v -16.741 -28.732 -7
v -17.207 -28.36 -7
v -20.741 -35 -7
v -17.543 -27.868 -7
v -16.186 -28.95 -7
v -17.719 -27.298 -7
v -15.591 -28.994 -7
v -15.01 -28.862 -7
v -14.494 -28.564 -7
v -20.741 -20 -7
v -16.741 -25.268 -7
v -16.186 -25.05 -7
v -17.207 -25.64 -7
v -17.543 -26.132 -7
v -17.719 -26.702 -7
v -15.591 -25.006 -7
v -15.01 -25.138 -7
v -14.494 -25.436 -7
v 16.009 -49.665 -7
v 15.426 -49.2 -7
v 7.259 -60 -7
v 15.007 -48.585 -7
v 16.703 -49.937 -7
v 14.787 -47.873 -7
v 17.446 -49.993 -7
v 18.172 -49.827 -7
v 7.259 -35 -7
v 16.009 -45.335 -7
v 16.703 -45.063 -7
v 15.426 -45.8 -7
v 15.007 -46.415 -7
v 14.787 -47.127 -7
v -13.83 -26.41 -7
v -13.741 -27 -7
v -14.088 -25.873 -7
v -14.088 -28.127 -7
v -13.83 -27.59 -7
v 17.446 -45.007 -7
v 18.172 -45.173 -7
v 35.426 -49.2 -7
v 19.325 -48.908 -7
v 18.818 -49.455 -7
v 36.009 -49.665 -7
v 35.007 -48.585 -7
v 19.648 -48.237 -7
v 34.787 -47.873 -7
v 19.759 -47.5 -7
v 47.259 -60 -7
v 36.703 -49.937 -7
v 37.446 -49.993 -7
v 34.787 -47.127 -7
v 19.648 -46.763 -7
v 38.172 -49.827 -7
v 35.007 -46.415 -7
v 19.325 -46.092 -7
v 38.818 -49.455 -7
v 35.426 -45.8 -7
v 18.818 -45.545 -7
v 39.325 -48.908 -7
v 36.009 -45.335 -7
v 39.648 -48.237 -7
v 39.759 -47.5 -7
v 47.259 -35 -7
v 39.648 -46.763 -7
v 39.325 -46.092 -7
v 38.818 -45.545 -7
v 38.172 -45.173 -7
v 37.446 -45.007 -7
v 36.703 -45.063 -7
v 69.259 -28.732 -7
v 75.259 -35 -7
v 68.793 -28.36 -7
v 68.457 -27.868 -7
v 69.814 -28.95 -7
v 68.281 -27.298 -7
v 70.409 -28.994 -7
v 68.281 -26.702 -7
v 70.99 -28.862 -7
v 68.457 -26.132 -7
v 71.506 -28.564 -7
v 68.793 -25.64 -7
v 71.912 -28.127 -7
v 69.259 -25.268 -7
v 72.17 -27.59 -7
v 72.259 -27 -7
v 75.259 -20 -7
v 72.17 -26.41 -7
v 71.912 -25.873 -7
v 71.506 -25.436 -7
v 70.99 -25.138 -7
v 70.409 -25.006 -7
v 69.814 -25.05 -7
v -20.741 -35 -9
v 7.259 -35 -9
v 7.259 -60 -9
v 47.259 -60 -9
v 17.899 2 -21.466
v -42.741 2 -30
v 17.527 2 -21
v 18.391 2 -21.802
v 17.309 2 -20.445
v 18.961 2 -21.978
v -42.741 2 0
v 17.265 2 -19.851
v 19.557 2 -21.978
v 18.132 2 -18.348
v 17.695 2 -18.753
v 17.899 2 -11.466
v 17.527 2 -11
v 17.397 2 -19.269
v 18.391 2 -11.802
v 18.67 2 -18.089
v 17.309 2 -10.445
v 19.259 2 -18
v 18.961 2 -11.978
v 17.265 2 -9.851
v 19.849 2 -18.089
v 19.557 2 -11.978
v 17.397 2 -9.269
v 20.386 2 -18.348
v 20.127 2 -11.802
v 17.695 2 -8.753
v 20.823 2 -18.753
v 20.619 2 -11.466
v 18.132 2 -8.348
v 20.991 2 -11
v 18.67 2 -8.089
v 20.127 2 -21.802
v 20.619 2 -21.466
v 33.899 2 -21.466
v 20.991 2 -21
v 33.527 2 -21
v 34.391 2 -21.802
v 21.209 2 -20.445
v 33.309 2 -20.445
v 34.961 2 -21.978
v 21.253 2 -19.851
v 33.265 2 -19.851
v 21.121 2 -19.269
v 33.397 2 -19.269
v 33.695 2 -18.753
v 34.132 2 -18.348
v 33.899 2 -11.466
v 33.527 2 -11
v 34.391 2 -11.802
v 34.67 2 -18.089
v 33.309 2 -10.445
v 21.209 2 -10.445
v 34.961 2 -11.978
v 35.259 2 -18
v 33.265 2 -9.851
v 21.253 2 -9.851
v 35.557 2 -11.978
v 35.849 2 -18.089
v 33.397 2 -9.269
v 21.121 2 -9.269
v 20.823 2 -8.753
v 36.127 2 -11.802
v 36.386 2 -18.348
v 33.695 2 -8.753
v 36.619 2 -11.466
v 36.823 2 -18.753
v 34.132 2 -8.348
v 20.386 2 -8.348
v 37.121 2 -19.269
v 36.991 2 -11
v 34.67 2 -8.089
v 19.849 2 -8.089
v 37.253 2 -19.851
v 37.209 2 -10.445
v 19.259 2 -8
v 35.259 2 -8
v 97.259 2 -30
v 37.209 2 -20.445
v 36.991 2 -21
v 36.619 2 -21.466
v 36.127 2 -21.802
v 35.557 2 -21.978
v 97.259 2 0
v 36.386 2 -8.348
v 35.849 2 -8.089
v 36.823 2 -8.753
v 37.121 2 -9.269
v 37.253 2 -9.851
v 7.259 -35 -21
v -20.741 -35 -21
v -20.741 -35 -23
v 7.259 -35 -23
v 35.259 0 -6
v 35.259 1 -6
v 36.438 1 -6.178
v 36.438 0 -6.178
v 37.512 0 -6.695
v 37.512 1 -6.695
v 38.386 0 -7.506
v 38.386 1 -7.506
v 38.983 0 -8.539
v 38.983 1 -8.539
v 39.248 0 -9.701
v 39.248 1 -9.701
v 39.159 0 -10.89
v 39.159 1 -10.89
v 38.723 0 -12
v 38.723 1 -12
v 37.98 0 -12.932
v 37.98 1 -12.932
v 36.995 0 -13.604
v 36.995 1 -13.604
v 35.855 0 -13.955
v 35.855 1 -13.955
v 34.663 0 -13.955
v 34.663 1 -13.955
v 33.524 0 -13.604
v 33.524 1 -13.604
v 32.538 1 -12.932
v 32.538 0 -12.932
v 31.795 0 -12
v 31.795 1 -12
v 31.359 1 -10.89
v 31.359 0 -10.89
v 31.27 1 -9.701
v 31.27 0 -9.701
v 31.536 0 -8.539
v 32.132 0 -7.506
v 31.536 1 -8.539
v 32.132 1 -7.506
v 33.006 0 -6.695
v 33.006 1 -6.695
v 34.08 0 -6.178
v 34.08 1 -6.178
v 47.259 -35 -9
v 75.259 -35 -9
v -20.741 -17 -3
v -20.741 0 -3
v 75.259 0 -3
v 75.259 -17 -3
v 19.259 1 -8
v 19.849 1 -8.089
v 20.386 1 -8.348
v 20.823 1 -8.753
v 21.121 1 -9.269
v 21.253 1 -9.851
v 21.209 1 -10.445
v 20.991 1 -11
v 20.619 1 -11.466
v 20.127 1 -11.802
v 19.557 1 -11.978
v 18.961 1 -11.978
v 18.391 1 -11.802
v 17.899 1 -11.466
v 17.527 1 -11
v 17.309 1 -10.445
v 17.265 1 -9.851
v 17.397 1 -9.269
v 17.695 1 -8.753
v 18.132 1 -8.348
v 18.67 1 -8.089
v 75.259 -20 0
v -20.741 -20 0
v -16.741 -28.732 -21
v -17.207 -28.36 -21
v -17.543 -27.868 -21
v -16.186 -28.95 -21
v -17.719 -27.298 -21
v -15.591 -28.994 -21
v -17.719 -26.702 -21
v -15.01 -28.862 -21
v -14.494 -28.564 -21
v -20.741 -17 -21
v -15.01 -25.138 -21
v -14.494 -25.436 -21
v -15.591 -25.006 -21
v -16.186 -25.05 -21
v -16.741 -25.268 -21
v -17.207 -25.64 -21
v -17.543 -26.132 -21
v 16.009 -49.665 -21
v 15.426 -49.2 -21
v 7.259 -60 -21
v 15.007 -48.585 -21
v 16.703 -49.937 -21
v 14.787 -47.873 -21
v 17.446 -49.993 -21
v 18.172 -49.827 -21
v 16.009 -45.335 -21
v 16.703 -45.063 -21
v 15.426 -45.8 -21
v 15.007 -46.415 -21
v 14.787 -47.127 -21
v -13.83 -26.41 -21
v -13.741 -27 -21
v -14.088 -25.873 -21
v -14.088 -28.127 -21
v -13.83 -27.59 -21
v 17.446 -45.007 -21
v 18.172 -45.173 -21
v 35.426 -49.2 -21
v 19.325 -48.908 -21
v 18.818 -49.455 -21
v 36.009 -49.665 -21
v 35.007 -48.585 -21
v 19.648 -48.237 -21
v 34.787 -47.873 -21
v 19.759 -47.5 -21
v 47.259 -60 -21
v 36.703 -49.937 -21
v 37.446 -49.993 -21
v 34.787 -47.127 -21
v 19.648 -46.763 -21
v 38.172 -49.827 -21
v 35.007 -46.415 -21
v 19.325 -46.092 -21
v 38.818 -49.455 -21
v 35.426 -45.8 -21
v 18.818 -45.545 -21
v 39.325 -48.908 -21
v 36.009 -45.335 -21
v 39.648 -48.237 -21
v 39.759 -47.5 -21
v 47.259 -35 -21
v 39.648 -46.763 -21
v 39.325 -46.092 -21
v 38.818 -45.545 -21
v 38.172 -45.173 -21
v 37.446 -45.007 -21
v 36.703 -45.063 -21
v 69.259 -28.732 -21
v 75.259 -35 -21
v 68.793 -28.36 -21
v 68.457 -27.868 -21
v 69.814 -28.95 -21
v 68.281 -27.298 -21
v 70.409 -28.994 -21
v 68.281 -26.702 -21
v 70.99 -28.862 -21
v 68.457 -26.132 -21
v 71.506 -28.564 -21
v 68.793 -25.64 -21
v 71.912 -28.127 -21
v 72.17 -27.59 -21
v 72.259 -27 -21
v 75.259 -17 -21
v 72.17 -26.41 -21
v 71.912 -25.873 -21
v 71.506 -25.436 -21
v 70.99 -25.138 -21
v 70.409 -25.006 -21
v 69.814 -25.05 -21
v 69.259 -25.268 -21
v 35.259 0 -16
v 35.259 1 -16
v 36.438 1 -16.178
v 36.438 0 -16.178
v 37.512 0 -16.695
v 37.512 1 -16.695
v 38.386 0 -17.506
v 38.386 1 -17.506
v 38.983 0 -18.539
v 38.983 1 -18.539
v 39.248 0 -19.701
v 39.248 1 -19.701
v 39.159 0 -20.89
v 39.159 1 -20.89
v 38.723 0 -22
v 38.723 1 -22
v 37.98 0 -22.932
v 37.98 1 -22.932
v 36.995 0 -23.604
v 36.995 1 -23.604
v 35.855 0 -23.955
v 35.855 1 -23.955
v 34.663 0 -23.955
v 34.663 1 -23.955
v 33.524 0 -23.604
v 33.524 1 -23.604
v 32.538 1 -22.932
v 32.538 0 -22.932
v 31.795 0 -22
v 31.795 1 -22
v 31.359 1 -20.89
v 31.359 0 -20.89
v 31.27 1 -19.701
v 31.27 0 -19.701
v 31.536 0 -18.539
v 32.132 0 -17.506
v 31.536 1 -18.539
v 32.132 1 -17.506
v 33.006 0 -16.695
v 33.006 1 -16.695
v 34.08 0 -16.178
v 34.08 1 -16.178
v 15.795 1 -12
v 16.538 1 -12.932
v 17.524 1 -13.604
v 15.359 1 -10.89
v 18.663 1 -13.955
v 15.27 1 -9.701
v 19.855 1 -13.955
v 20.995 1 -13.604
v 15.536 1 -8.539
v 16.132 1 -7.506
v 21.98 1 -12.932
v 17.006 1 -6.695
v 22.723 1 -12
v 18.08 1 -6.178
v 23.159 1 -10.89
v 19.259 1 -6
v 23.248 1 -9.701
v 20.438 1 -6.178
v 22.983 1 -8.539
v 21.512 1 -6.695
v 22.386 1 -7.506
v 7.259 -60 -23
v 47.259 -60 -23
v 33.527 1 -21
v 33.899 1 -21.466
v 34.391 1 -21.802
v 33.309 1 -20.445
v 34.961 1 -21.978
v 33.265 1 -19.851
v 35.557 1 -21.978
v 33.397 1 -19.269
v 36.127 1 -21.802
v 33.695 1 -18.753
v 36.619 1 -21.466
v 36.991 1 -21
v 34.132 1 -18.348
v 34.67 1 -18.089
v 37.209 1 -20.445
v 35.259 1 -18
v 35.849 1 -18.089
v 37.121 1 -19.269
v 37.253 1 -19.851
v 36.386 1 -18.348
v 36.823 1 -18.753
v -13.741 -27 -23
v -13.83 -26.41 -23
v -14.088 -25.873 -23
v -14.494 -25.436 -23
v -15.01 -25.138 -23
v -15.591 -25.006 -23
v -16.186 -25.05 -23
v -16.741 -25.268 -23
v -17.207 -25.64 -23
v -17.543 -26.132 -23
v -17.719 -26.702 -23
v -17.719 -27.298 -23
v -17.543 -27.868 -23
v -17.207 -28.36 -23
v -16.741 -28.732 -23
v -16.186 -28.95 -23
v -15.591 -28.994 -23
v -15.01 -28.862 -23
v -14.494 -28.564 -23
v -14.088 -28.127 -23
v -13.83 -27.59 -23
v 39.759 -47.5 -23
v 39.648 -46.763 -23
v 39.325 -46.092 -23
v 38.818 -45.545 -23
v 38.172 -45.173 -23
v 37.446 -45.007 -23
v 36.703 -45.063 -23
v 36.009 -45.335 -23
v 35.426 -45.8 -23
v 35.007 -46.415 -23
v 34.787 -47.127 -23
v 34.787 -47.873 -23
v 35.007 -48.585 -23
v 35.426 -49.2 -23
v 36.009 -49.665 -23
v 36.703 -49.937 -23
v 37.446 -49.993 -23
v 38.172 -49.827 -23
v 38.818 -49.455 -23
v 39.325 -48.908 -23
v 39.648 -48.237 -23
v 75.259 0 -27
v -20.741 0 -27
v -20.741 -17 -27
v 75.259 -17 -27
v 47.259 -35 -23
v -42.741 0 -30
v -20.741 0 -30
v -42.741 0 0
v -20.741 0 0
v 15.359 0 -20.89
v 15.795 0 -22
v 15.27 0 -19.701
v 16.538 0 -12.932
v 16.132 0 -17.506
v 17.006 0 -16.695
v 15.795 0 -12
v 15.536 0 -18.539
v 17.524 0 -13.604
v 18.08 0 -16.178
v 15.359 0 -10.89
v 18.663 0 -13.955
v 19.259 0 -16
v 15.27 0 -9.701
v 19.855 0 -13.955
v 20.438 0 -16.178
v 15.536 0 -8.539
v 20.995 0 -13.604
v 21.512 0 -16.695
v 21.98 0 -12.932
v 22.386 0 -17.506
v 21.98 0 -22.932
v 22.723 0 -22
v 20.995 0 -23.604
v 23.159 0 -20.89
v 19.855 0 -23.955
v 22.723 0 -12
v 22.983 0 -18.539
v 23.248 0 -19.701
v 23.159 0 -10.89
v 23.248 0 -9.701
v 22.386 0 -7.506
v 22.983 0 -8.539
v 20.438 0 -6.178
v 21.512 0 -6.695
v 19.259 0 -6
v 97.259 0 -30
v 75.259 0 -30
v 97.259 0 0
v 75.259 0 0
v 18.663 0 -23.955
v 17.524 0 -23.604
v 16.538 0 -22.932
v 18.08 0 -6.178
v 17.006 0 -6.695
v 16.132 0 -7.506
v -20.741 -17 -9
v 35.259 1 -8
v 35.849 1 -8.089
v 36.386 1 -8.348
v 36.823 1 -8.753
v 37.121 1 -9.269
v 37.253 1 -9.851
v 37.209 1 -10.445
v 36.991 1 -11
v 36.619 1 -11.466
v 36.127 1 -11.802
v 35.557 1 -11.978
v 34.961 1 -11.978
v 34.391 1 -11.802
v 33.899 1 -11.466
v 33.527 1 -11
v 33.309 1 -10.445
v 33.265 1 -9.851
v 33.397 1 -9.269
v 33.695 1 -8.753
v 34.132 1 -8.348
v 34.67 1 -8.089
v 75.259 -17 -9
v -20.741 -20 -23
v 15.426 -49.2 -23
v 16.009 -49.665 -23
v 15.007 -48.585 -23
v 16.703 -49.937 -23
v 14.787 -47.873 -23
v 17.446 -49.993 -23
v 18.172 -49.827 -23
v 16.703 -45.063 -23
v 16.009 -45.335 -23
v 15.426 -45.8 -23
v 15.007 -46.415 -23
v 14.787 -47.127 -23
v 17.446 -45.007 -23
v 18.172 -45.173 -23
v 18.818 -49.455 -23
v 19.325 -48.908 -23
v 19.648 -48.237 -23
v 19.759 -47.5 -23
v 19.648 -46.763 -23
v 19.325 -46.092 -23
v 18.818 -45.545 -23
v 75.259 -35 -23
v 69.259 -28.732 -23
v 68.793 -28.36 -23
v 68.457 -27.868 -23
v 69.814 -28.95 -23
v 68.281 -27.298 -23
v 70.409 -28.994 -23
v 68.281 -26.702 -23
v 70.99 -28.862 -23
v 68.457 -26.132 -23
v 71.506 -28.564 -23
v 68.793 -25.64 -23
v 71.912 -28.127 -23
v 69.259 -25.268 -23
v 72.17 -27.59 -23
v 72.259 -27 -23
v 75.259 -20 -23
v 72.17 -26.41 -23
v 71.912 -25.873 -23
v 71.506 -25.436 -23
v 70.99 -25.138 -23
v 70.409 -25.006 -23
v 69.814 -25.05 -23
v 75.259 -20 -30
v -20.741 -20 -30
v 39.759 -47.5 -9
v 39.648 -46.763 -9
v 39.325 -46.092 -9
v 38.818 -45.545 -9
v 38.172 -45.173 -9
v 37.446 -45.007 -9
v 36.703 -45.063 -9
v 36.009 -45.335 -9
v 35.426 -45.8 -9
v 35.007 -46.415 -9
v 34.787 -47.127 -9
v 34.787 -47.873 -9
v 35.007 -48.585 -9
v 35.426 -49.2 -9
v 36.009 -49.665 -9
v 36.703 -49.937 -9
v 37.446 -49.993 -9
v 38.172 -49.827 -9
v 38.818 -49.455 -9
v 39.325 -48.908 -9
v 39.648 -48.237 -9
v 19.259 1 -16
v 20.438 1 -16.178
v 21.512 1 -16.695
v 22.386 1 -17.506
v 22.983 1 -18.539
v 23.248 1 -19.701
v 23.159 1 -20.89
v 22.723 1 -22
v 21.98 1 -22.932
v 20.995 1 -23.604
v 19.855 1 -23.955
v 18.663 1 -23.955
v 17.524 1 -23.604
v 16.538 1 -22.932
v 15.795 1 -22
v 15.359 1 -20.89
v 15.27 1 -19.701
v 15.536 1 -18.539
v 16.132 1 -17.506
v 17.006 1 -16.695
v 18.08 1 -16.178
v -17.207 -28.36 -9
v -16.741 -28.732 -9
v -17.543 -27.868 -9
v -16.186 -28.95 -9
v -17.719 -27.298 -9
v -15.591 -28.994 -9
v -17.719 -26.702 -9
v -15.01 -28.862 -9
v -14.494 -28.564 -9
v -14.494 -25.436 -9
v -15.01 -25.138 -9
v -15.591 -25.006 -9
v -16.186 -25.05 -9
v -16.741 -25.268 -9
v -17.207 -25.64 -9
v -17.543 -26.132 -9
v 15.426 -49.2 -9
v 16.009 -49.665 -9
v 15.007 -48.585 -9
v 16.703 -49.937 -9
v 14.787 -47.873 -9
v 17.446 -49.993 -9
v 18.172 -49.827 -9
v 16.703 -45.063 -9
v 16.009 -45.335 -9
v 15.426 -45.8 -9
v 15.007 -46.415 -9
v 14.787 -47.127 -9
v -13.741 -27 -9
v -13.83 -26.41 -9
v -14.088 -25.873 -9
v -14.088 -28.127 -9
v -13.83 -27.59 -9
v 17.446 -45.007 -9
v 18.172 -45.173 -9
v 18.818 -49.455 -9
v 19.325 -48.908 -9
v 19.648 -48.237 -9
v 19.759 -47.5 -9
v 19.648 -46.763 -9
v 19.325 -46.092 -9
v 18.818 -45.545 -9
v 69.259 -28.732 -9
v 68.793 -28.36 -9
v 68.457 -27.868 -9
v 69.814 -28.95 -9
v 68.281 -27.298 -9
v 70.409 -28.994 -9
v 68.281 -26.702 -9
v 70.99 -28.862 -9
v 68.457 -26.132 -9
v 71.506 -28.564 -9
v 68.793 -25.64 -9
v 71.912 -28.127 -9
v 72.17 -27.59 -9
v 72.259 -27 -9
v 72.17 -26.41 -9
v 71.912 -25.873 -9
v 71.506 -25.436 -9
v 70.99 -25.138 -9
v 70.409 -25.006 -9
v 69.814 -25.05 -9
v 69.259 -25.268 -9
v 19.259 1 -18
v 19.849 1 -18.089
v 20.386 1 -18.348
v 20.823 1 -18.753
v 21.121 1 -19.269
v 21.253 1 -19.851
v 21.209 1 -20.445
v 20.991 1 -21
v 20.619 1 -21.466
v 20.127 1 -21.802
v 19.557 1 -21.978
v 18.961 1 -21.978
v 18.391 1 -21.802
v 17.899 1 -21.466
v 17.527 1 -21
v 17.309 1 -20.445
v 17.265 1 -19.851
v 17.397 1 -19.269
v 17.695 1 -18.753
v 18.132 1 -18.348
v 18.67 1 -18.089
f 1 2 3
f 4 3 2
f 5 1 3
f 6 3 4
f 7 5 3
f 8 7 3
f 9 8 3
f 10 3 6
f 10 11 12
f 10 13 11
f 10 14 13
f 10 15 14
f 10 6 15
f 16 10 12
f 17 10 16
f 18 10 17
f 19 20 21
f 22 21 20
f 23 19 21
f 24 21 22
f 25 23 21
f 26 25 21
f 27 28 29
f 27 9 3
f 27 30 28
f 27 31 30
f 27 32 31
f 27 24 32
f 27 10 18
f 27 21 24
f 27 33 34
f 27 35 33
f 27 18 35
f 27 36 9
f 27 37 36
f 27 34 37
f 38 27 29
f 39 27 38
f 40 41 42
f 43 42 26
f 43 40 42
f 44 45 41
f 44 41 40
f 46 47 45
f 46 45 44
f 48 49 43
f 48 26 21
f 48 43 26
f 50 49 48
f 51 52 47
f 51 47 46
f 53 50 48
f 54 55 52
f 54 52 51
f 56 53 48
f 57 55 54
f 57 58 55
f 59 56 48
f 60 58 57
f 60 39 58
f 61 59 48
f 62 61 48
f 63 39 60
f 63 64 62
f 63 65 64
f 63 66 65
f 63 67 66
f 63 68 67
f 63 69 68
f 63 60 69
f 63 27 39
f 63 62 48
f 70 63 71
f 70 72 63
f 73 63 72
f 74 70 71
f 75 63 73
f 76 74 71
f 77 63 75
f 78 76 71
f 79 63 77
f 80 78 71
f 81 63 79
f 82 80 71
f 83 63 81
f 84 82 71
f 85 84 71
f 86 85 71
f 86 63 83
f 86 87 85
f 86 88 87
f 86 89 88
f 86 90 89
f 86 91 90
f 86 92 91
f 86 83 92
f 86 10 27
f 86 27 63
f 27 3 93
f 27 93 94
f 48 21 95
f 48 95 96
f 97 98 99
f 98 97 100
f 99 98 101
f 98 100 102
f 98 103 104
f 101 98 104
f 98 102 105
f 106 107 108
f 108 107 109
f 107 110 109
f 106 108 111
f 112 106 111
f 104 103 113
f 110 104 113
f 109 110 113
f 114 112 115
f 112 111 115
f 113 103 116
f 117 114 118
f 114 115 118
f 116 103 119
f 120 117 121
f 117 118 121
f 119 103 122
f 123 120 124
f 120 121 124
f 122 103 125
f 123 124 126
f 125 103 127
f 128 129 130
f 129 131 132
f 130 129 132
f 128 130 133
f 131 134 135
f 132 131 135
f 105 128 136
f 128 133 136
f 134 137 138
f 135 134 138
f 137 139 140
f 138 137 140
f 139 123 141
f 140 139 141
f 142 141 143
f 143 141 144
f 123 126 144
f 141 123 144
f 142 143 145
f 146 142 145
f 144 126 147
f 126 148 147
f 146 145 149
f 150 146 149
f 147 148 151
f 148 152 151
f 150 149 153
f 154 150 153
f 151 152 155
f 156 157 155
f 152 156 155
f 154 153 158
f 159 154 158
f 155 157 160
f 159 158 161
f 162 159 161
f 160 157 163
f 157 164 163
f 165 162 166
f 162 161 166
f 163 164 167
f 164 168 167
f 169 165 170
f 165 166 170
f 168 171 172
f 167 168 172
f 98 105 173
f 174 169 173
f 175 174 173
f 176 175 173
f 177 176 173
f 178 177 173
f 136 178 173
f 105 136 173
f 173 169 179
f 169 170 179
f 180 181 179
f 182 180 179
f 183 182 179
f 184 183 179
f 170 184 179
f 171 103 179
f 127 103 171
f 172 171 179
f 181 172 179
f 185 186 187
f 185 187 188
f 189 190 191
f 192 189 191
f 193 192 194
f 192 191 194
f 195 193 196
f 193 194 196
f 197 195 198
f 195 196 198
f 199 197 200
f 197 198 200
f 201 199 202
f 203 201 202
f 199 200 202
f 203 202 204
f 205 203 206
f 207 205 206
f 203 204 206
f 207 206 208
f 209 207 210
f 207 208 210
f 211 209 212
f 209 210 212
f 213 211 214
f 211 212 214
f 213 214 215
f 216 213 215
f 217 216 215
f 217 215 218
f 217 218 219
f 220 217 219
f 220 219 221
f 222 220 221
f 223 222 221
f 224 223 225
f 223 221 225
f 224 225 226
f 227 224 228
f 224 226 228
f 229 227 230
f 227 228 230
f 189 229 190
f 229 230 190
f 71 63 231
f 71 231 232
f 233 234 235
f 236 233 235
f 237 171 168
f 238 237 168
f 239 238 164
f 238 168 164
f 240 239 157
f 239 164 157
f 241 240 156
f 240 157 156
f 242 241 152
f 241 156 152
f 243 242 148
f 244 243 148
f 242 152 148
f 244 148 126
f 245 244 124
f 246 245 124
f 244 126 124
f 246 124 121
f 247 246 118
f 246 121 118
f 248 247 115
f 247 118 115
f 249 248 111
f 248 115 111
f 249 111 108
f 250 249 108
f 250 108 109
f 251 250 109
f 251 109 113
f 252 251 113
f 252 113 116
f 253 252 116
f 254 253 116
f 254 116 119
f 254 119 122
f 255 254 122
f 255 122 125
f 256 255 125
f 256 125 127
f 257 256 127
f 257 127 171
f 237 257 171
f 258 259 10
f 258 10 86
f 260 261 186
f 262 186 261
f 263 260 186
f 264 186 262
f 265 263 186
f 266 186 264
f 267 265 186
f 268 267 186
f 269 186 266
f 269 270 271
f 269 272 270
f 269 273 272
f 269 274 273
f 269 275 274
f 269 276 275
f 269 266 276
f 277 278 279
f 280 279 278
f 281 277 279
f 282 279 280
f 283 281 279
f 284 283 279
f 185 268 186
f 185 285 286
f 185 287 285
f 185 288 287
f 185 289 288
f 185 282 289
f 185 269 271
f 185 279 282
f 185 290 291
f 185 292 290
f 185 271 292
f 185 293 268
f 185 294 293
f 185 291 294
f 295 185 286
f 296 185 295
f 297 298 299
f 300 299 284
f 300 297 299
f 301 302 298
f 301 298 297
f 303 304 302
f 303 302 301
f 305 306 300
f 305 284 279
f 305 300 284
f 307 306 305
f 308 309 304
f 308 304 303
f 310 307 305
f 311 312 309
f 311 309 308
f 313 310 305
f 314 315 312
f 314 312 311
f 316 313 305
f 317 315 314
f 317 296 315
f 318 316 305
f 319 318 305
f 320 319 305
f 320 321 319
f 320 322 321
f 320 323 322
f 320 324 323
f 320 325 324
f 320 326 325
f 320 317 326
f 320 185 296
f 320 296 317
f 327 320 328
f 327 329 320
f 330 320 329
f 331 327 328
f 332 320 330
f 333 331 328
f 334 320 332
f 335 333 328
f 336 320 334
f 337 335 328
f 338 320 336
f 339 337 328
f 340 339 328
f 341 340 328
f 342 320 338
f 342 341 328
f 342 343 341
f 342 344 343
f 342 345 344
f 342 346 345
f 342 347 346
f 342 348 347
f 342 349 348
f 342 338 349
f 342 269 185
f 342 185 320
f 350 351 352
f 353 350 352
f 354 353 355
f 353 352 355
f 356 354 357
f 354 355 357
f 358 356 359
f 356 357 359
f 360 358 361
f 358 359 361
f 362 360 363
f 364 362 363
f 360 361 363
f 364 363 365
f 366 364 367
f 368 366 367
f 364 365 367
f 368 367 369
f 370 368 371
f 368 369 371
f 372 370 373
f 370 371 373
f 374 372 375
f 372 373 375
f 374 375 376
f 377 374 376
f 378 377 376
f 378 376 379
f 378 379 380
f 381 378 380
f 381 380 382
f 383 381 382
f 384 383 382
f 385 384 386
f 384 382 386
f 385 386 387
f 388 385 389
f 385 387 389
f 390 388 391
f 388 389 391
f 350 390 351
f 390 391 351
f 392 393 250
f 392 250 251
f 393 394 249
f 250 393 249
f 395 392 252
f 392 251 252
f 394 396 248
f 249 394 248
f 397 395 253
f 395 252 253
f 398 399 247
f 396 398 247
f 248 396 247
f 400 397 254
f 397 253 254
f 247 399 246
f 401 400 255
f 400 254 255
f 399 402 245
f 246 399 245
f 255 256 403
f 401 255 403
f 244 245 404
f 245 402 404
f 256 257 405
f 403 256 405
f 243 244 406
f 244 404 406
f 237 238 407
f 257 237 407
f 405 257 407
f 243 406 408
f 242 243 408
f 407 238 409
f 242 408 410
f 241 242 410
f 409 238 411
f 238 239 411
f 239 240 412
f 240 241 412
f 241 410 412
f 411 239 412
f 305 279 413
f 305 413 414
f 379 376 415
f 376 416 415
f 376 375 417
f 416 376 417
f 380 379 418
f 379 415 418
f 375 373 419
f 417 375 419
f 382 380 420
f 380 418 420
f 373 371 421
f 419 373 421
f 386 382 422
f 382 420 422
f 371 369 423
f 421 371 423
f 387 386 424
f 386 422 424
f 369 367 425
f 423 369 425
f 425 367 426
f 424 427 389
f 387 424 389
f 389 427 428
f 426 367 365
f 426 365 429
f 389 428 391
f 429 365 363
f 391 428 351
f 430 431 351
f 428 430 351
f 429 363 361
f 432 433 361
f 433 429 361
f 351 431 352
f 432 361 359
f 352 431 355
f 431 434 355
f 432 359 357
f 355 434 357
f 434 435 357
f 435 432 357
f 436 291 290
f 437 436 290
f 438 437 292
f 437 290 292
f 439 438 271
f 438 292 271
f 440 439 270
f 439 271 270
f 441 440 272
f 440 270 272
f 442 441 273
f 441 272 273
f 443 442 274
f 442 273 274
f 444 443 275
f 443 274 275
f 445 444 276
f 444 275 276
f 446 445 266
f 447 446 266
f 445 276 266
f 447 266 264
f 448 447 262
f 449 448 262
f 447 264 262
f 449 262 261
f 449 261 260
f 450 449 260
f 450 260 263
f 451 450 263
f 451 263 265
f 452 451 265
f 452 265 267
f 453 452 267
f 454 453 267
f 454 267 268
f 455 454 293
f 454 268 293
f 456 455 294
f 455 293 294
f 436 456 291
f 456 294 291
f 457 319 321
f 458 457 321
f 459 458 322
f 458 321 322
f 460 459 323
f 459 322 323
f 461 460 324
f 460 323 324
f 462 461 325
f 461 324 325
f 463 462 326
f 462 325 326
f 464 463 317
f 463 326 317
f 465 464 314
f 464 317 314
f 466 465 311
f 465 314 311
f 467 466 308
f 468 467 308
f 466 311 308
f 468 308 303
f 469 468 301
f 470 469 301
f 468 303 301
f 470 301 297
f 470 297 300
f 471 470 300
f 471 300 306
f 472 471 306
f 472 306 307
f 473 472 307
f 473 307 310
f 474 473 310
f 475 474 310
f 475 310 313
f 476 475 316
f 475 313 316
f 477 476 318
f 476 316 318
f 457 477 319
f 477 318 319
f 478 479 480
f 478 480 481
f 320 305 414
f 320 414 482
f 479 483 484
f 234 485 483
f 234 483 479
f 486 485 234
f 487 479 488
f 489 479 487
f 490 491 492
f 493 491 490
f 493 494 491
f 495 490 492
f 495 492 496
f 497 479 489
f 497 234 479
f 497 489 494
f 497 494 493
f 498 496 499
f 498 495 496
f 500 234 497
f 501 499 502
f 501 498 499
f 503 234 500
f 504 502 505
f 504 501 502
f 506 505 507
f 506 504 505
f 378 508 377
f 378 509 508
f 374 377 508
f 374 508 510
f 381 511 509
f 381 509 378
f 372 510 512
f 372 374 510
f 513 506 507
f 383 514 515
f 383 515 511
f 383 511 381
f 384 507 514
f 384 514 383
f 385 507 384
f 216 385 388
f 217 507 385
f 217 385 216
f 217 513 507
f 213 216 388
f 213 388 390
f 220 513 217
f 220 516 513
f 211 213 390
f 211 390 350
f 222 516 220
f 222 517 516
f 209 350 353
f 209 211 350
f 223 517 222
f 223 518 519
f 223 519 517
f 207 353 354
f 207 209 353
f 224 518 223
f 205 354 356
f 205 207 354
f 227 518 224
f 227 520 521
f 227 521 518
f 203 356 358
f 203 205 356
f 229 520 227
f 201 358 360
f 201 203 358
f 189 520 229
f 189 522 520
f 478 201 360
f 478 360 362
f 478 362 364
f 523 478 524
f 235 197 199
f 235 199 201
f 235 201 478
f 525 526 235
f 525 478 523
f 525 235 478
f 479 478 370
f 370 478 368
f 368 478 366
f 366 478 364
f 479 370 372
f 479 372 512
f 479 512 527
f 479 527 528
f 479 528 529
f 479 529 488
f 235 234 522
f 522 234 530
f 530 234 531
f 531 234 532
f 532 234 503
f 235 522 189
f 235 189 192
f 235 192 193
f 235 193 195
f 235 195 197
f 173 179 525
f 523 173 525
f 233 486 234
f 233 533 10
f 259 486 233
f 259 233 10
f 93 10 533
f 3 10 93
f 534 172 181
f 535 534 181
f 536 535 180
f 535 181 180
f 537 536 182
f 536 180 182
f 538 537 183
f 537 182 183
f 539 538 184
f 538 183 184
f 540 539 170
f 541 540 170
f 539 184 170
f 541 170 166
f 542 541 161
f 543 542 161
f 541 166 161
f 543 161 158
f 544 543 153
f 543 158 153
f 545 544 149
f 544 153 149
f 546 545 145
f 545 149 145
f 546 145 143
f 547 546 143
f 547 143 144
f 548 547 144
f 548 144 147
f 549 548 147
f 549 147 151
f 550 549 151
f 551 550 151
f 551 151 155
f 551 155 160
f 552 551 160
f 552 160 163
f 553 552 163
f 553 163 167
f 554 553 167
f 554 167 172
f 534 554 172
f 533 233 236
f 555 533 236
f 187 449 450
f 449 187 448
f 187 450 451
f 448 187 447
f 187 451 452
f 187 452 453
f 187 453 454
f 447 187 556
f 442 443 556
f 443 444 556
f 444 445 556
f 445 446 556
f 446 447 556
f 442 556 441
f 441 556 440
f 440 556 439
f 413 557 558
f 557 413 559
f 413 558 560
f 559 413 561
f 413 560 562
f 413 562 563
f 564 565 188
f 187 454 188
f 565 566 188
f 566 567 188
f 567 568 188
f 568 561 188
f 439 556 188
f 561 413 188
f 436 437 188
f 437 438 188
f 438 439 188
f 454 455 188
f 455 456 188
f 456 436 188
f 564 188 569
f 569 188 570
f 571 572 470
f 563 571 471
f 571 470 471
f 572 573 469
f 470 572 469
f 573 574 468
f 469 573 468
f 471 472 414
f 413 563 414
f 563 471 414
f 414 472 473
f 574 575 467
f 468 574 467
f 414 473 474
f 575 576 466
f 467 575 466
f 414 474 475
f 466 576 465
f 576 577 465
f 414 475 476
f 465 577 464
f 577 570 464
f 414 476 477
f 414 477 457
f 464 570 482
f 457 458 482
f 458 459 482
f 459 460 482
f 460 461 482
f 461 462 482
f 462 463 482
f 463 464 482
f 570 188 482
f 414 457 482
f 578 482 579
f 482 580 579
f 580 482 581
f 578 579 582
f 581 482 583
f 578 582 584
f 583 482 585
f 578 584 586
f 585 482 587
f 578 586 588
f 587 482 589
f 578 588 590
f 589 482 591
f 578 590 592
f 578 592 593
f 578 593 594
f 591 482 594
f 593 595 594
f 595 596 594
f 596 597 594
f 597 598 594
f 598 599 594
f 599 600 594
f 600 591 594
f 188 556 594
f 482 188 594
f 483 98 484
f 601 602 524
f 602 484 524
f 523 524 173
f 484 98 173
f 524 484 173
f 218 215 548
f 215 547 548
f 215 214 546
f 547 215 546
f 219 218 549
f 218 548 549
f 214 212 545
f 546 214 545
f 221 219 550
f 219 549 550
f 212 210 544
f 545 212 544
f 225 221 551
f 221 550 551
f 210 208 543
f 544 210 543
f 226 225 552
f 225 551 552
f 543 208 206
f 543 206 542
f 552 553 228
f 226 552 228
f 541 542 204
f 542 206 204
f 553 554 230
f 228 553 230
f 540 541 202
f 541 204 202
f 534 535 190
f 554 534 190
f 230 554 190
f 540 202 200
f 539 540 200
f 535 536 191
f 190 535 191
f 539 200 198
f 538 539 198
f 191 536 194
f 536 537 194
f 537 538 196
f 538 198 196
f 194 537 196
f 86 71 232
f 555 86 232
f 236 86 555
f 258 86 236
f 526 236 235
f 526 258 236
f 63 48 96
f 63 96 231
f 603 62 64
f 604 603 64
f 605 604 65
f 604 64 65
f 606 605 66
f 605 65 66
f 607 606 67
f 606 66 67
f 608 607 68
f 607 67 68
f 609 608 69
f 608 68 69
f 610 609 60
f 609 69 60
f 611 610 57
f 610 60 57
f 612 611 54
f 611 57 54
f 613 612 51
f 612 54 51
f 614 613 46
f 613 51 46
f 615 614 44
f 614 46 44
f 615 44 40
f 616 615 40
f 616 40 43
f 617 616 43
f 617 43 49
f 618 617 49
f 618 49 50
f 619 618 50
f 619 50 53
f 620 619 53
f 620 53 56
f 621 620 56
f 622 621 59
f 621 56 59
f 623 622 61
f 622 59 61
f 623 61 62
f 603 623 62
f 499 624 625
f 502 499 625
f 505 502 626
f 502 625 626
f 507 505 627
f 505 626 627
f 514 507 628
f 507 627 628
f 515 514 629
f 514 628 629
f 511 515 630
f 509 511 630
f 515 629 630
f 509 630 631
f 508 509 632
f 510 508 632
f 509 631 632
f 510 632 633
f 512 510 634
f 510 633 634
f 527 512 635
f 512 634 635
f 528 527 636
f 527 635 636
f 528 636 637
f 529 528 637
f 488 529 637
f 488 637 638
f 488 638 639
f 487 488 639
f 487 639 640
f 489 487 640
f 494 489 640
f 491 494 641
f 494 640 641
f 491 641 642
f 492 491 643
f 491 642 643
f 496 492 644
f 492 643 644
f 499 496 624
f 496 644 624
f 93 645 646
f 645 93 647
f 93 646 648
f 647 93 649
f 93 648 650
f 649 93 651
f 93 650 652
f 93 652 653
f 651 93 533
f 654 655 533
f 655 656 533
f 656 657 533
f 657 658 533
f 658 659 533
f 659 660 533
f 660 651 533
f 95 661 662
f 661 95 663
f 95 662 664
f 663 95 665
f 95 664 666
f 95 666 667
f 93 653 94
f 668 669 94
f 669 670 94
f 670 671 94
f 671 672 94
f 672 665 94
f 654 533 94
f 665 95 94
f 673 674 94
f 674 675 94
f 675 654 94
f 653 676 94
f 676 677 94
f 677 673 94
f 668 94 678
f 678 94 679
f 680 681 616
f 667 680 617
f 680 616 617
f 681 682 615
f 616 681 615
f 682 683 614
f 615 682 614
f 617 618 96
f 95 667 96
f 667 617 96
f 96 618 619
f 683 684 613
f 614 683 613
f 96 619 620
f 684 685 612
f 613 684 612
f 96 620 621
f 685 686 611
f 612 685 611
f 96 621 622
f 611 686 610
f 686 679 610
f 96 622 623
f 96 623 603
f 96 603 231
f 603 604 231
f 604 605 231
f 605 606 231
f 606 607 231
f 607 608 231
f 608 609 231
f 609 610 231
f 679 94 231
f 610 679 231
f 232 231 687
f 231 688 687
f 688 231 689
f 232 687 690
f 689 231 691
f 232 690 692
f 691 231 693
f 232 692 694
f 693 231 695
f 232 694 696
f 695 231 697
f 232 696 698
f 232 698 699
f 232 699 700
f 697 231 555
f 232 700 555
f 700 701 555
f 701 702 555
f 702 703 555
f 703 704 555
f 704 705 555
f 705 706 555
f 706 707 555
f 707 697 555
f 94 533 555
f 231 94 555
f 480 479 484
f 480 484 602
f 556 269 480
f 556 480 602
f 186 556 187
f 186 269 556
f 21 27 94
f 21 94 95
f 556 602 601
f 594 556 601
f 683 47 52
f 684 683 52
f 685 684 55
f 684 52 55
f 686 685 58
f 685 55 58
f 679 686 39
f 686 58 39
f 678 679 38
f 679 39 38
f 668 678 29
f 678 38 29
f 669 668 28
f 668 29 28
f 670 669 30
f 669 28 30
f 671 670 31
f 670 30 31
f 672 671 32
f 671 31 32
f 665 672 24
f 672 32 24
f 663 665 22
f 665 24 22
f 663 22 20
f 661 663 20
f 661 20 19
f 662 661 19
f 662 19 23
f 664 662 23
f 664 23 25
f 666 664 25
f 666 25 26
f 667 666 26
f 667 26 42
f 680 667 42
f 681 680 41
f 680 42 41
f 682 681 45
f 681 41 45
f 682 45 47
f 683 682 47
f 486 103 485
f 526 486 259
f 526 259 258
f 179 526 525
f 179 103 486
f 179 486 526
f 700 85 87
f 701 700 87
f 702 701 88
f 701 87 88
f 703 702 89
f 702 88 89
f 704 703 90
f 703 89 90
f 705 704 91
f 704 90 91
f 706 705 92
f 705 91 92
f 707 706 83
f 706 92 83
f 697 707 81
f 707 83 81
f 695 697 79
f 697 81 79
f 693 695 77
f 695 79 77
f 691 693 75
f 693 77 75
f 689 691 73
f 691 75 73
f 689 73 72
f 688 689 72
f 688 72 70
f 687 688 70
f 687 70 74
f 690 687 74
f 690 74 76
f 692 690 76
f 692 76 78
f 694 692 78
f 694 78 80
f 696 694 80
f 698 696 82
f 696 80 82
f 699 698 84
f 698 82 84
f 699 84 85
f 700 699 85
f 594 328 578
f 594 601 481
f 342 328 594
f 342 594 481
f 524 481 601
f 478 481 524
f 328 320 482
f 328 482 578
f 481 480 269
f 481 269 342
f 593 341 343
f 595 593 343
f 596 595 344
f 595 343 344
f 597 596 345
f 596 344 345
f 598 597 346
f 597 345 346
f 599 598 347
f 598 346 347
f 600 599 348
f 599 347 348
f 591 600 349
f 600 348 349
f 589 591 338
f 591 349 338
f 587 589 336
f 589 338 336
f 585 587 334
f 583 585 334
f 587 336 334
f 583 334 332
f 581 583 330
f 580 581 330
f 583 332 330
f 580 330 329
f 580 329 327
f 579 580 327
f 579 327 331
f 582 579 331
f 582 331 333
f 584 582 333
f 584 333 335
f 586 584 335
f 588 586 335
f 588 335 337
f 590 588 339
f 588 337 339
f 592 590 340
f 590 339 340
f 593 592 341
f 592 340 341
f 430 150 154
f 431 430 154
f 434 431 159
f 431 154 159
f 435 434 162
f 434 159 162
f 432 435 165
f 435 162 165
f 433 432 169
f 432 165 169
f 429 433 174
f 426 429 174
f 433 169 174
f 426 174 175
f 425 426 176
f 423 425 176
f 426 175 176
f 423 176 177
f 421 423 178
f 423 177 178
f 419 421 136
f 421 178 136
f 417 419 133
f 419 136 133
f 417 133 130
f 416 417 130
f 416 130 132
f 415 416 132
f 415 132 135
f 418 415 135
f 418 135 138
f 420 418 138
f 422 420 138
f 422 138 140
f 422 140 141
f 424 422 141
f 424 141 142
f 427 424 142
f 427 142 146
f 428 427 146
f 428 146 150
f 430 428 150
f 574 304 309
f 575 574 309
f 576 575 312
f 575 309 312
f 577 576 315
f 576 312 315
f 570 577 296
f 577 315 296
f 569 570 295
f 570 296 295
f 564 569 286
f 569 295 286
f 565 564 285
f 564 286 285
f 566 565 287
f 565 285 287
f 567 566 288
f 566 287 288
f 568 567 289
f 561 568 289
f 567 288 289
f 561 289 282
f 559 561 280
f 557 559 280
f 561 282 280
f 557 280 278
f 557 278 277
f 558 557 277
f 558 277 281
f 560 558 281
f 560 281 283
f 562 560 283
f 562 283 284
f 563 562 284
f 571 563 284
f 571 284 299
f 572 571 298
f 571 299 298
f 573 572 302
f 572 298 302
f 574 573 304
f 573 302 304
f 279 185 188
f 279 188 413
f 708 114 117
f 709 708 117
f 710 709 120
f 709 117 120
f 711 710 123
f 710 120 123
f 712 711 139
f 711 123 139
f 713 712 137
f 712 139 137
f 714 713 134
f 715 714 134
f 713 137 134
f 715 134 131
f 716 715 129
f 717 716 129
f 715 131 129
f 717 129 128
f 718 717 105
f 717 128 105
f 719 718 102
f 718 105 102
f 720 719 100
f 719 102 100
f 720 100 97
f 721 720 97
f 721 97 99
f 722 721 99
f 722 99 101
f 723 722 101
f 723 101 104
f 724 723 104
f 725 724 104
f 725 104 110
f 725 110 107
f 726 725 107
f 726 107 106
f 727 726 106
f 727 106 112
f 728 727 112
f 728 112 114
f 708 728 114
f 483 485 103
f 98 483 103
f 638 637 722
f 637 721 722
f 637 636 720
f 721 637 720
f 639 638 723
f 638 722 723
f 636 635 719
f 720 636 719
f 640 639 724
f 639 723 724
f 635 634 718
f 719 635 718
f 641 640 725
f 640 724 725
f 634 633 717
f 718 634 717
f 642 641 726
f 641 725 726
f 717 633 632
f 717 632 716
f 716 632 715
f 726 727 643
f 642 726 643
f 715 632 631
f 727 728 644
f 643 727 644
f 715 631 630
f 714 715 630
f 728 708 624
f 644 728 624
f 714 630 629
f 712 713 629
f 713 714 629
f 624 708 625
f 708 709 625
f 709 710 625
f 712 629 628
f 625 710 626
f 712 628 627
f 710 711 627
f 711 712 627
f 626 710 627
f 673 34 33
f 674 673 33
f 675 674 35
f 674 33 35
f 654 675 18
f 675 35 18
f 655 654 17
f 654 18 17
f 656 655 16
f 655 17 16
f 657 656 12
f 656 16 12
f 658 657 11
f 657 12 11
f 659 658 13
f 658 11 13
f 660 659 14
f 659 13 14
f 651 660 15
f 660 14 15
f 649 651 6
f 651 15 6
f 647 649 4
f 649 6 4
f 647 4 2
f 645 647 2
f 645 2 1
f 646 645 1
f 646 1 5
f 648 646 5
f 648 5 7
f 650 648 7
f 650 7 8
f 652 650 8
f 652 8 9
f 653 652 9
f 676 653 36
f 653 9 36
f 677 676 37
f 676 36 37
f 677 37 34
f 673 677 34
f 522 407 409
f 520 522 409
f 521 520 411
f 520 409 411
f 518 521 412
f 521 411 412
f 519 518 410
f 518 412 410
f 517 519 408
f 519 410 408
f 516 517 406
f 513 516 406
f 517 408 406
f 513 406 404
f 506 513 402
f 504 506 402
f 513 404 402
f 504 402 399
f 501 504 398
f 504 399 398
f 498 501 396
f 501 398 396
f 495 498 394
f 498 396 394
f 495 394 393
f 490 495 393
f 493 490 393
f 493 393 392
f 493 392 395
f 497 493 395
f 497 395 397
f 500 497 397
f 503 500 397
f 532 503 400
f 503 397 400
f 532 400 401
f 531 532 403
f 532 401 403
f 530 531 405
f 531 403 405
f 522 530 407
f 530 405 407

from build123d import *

# Parameters (mm, degrees)
TOP_DEPTH          = 30
PROFILE_3_W        = 96
PROFILE_3_H        = 17
SIDE_DEPTH         = 3
PROFILE_6_W        = 96
PROFILE_6_H        = 3
BEND_DEPTH         = 9
SCREWPLATE_START   = -7
PROFILE_7_R        = 2.5
PROFILE_7_R_2      = 2
SCREWPLATE_DEPTH   = 2
SIDE2_START        = -30
PROFILE_8_W        = 96
PROFILE_8_H        = 17
SIDE2_DEPTH        = 3
BEND2_START        = -30
PROFILE_9_W        = 96
PROFILE_9_H        = 3
BEND2_DEPTH        = 9
SCREWPLATE2_START  = -21
PROFILE_10_R       = 2.5
PROFILE_10_R_2     = 2
SCREWPLATE2_DEPTH  = 2
SKETCH3_R          = 2
CUT_EXTRUDE4_DEPTH = 2
CUT_EXTRUDE5_START = -1
SKETCH3_3_R        = 4
SKETCH3_3_R_2      = 2
CUT_EXTRUDE5_DEPTH = 1


with BuildPart() as part:
    # Profile → Top (new body)
    with BuildSketch(Plane.XY):
        Polygon((97.259067876, 0), (87.259067876, 0), (-32.740932124, 0), (-42.740932124, 0), (-42.740932124, 2), (97.259067876, 2), align=None)
    extrude(amount=-TOP_DEPTH)

    # Profile<3> → Side (add)
    with BuildSketch(Plane.XY):
        with Locations((27.259067876, -8.5)):
            Rectangle(PROFILE_3_W, PROFILE_3_H)
    extrude(amount=-SIDE_DEPTH)

    # Profile<6> → Bend (add)
    with BuildSketch(Plane.XY):
        with Locations((27.259067876, -18.5)):
            Rectangle(PROFILE_6_W, PROFILE_6_H)
    extrude(amount=-BEND_DEPTH)

    # Profile<7> → ScrewPlate (add)
    with BuildSketch(Plane.XY.offset(SCREWPLATE_START)):
        Polygon((75.259067876, -20), (-20.740932124, -20), (-20.740932124, -35), (7.259067876, -35), (7.259067876, -60), (27.259067876, -60), (47.259067876, -60), (47.259067876, -35), (75.259067876, -35), align=None)
        with Locations((17.259067876, -47.5)):
            Circle(PROFILE_7_R, mode=Mode.SUBTRACT)
        with Locations((37.259067876, -47.5)):
            Circle(PROFILE_7_R, mode=Mode.SUBTRACT)
        with Locations((-15.740932124, -27)):
            Circle(PROFILE_7_R_2, mode=Mode.SUBTRACT)
        with Locations((70.259067876, -27)):
            Circle(PROFILE_7_R_2, mode=Mode.SUBTRACT)
    extrude(amount=-SCREWPLATE_DEPTH)

    # Profile<8> → Side2 (add)
    with BuildSketch(Plane.XY.offset(SIDE2_START)):
        with Locations((27.259067876, -8.5)):
            Rectangle(PROFILE_8_W, PROFILE_8_H)
    extrude(amount=SIDE2_DEPTH)

    # Profile<9> → Bend2 (add)
    with BuildSketch(Plane.XY.offset(BEND2_START)):
        with Locations((27.259067876, -18.5)):
            Rectangle(PROFILE_9_W, PROFILE_9_H)
    extrude(amount=BEND2_DEPTH)

    # Profile<10> → ScrewPlate2 (add)
    with BuildSketch(Plane.XY.offset(SCREWPLATE2_START)):
        Polygon((75.259067876, -20), (-20.740932124, -20), (-20.740932124, -35), (7.259067876, -35), (7.259067876, -60), (27.259067876, -60), (47.259067876, -60), (47.259067876, -35), (75.259067876, -35), align=None)
        with Locations((17.259067876, -47.5)):
            Circle(PROFILE_10_R, mode=Mode.SUBTRACT)
        with Locations((37.259067876, -47.5)):
            Circle(PROFILE_10_R, mode=Mode.SUBTRACT)
        with Locations((-15.740932124, -27)):
            Circle(PROFILE_10_R_2, mode=Mode.SUBTRACT)
        with Locations((70.259067876, -27)):
            Circle(PROFILE_10_R_2, mode=Mode.SUBTRACT)
    extrude(amount=-SCREWPLATE2_DEPTH)

    # Sketch3 → Cut-Extrude4 (cut)
    with BuildSketch(Plane(origin=(0, 2, 0), x_dir=(1, 0, 0), z_dir=(0, 1, 0))):
        with Locations(Location((19.259067876, 20, 0), (0, 0, 270))):
            Circle(SKETCH3_R)
        with Locations(Location((35.259067876, 20, 0), (0, 0, 270))):
            Circle(SKETCH3_R)
        with Locations(Location((35.259067876, 10, 0), (0, 0, 270))):
            Circle(SKETCH3_R)
        with Locations(Location((19.259067876, 10, 0), (0, 0, 270))):
            Circle(SKETCH3_R)
    extrude(amount=-CUT_EXTRUDE4_DEPTH, mode=Mode.SUBTRACT)

    # Sketch3<3> → Cut-Extrude5 (cut)
    # profile 1 of 4: a face of its own
    with BuildSketch(Plane(origin=(0, 2, 0), x_dir=(1, 0, 0), z_dir=(0, 1, 0)).offset(CUT_EXTRUDE5_START)):
        with Locations(Location((19.259067876, 20, 0), (0, 0, 270))):
            Circle(SKETCH3_3_R)
        with Locations(Location((19.259067876, 20, 0), (0, 0, 270))):
            Circle(SKETCH3_3_R_2, mode=Mode.SUBTRACT)
    # profile 2 of 4: a face of its own
    with BuildSketch(Plane(origin=(0, 2, 0), x_dir=(1, 0, 0), z_dir=(0, 1, 0)).offset(CUT_EXTRUDE5_START)):
        with Locations(Location((35.259067876, 20, 0), (0, 0, 270))):
            Circle(SKETCH3_3_R)
        with Locations(Location((35.259067876, 20, 0), (0, 0, 270))):
            Circle(SKETCH3_3_R_2, mode=Mode.SUBTRACT)
    # profile 3 of 4: a face of its own
    with BuildSketch(Plane(origin=(0, 2, 0), x_dir=(1, 0, 0), z_dir=(0, 1, 0)).offset(CUT_EXTRUDE5_START)):
        with Locations(Location((35.259067876, 10, 0), (0, 0, 270))):
            Circle(SKETCH3_3_R)
        with Locations(Location((35.259067876, 10, 0), (0, 0, 270))):
            Circle(SKETCH3_3_R_2, mode=Mode.SUBTRACT)
    # profile 4 of 4: a face of its own
    with BuildSketch(Plane(origin=(0, 2, 0), x_dir=(1, 0, 0), z_dir=(0, 1, 0)).offset(CUT_EXTRUDE5_START)):
        with Locations(Location((19.259067876, 10, 0), (0, 0, 270))):
            Circle(SKETCH3_3_R)
        with Locations(Location((19.259067876, 10, 0), (0, 0, 270))):
            Circle(SKETCH3_3_R_2, mode=Mode.SUBTRACT)
    extrude(amount=-CUT_EXTRUDE5_DEPTH, mode=Mode.SUBTRACT)


solid = part.part
